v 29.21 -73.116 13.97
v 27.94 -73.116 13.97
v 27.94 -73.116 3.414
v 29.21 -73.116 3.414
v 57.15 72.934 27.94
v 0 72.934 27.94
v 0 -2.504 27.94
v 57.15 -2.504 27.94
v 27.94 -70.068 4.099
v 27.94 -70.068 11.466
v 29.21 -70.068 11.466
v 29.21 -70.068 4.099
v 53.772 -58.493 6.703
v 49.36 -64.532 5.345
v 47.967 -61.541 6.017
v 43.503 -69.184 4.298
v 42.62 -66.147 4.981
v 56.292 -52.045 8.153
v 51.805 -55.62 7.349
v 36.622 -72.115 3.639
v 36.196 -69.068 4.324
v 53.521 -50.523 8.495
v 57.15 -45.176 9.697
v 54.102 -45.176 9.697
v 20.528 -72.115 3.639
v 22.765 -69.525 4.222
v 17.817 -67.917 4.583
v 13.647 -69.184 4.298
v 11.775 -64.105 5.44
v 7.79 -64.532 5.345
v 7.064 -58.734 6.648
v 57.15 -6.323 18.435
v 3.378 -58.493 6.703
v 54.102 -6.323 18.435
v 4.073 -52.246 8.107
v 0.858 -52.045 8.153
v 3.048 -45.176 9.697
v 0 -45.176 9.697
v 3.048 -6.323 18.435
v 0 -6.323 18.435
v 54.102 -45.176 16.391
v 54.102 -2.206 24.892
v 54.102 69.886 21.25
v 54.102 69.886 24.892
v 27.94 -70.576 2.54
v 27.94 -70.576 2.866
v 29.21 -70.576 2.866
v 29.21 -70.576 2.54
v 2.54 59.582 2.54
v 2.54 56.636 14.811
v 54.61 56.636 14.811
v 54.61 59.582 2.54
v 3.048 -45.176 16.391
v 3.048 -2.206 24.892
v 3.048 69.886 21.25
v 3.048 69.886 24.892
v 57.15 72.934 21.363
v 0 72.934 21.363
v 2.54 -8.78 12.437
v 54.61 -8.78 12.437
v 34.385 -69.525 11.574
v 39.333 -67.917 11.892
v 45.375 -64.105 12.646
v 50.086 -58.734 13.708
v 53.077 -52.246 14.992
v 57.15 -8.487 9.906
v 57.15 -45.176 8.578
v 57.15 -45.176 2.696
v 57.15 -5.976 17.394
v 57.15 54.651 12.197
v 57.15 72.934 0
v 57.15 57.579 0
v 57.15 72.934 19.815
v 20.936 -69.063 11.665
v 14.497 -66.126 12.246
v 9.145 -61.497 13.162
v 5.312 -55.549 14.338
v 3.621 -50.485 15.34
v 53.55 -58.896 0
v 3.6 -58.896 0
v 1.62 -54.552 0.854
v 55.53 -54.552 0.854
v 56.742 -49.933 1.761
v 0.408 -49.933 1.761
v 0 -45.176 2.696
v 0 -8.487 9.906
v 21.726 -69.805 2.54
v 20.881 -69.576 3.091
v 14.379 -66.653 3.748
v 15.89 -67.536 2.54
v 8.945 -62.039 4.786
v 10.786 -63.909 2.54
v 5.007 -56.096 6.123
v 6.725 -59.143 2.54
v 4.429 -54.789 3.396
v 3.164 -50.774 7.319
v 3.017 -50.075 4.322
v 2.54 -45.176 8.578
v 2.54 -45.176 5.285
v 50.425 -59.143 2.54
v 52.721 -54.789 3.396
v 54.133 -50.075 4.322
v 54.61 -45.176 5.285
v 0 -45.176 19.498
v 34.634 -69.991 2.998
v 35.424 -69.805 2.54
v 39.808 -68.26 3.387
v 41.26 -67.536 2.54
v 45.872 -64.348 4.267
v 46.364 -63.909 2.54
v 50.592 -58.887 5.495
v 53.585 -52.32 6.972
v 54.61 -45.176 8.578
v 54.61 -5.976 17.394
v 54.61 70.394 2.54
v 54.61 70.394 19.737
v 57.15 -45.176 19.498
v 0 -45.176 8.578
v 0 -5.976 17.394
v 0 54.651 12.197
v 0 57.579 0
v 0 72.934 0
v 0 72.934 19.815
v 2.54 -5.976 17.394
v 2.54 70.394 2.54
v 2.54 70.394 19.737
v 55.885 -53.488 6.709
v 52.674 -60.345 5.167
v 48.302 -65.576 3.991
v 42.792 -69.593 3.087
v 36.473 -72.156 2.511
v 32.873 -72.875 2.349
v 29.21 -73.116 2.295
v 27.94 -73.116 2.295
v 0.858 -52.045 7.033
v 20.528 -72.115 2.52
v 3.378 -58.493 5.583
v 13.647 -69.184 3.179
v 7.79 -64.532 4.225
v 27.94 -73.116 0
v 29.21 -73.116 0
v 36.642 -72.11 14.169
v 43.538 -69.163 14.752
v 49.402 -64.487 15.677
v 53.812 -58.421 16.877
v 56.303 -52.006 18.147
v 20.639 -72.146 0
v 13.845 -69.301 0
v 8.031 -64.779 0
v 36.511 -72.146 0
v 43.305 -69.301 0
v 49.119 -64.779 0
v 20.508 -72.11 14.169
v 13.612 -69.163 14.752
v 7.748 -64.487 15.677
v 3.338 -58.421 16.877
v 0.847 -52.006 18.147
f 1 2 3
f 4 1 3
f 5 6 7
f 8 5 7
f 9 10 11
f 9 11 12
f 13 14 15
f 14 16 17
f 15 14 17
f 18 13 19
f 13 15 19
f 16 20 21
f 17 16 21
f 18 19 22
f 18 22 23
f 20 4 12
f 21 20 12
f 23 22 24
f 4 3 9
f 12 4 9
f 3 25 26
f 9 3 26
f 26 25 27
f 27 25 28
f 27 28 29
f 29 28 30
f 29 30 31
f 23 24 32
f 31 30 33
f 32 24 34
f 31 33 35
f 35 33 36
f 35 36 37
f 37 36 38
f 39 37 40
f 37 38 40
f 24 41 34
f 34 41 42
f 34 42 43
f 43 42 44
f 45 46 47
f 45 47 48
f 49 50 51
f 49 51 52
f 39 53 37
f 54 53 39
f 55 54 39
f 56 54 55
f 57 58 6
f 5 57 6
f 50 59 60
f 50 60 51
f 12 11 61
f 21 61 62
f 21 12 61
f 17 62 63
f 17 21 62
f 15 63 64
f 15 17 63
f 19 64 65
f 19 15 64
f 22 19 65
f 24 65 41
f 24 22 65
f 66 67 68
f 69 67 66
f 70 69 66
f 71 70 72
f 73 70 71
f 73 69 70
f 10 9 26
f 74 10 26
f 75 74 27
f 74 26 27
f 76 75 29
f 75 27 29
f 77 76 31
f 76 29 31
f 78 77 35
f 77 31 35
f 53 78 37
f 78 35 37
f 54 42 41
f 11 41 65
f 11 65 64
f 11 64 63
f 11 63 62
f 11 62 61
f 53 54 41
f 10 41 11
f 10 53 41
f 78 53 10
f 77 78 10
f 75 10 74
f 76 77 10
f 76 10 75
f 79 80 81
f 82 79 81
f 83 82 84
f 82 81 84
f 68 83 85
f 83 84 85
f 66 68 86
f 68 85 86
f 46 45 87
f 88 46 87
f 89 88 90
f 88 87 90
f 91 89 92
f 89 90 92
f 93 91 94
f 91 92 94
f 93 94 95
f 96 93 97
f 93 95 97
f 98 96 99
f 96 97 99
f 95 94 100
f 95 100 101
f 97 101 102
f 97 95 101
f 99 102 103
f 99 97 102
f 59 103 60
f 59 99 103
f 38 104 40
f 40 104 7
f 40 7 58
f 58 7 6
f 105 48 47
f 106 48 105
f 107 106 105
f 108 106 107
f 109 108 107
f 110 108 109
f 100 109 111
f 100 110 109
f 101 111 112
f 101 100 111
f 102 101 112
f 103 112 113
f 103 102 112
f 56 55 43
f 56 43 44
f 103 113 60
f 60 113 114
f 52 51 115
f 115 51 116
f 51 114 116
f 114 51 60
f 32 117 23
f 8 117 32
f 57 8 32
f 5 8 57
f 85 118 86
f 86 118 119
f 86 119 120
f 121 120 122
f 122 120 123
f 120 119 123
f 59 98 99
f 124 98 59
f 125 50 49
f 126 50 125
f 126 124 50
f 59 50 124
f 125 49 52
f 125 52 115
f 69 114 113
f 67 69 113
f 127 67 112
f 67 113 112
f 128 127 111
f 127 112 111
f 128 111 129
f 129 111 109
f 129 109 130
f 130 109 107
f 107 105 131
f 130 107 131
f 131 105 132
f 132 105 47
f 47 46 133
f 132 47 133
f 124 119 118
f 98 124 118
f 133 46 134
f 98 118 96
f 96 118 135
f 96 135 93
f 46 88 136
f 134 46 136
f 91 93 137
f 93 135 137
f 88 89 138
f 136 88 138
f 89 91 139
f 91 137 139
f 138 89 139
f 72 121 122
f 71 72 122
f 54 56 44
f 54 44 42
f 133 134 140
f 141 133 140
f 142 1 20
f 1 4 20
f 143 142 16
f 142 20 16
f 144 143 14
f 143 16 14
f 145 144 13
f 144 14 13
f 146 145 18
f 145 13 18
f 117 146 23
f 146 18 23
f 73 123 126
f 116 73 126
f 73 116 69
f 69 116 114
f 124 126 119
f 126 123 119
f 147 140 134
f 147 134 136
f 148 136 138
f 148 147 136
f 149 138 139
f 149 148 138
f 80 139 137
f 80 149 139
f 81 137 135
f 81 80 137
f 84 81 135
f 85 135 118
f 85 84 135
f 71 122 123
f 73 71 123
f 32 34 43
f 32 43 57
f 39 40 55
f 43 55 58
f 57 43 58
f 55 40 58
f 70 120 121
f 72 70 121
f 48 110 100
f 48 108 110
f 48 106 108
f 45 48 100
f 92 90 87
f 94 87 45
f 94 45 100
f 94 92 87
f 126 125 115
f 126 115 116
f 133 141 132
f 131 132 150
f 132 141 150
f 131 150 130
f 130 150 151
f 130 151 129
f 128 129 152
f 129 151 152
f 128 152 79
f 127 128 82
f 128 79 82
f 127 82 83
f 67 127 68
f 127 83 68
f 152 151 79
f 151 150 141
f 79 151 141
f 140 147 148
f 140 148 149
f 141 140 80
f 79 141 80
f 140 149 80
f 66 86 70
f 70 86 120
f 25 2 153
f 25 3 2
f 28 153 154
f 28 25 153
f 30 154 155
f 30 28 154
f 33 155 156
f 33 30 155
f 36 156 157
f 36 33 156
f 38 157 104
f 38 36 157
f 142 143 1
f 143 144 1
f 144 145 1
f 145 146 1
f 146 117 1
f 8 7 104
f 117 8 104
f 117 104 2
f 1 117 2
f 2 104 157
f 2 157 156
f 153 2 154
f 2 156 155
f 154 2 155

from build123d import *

# Parameters (mm, degrees)
F1_DEPTH    = 57.15
F2_R        = 27.94
F3_T        = -3.048
F4_DEPTH    = 57.15
F5_T1_DEPTH = 141.9948617116
F6_T        = -2.54


# Not quite as in the source:
# - a fillet or chamfer that OpenCascade refuses, or shapes differently, is made with other operations: its cross-section is extruded or revolved along the edge and cut away or added


with BuildPart() as f1:
    # F0 (on Right) → F1 (new body)
    with BuildSketch(Plane.YZ):
        Polygon((-73.1163992389, 13.97), (-73.1163992389, 3.4139757045), (-6.3229924999, 18.4347908944), (72.9336007611, 21.3625766337), (72.9336007611, 27.94), (-2.5041415356, 27.94), align=None)
    extrude(amount=F1_DEPTH)

    # F2
    f2_edges = [f1.edges().sort_by_distance(p)[0] for p in [
        (0, -73.116399, 8.691988),
        (57.15, -73.116399, 8.691988),
    ]]
    fillet(f2_edges, radius=F2_R)

    # F3
    f3_openings = [f1.faces().sort_by_distance(p)[0] for p in [
        (28.575, 33.305304, 19.898684),
        (28.575, -37.106773, 11.51199),
    ]]
    offset(amount=F3_T, openings=f3_openings)


with BuildPart() as f4:
    # F0 (on Right) → F4 (new body)
    with BuildSketch(Plane.YZ):
        Polygon((-73.1163992389, 2.2948617116), (-73.1163992389, 0), (-58.8958412409, 0), (-8.487008512, 9.9060228094), (54.6513311565, 12.197333388), (57.5791150331, 0), (72.9336007611, 0), (72.9336007611, 19.8148395866), (-5.9758147364, 17.3937518685), align=None)
    extrude(amount=F4_DEPTH)

    # F5: fillet of radius 27.94 on 2 edges, made by hand

    # F5_s2 → F5_t1 (cut)
    with BuildSketch(Plane.XY.offset(-69.85)):
        with BuildLine():
            ThreePointArc((29.21, -73.1163992389), (48.9665634664, -64.9329627053), (57.15, -45.1763992389))
            Line((57.15, -45.1763992389), (57.15, -73.1163992389))
            Line((57.15, -73.1163992389), (29.21, -73.1163992389))
        make_face()
        with BuildLine():
            ThreePointArc((27.94, -73.1163992389), (8.1834365336, -64.9329627053), (0, -45.1763992389))
            Line((0, -45.1763992389), (0, -73.1163992389))
            Line((0, -73.1163992389), (27.94, -73.1163992389))
        make_face()
    extrude(amount=F5_T1_DEPTH, mode=Mode.SUBTRACT)

    # F6
    f6_openings = [f4.faces().sort_by_distance(p)[0] for p in [
        (28.575, -36.93138, 10.432319),
        (28.575, 33.478893, 18.604296),
    ]]
    offset(amount=F6_T, openings=f6_openings, kind=Kind.INTERSECTION)


solid = Compound([f1.part, f4.part])
